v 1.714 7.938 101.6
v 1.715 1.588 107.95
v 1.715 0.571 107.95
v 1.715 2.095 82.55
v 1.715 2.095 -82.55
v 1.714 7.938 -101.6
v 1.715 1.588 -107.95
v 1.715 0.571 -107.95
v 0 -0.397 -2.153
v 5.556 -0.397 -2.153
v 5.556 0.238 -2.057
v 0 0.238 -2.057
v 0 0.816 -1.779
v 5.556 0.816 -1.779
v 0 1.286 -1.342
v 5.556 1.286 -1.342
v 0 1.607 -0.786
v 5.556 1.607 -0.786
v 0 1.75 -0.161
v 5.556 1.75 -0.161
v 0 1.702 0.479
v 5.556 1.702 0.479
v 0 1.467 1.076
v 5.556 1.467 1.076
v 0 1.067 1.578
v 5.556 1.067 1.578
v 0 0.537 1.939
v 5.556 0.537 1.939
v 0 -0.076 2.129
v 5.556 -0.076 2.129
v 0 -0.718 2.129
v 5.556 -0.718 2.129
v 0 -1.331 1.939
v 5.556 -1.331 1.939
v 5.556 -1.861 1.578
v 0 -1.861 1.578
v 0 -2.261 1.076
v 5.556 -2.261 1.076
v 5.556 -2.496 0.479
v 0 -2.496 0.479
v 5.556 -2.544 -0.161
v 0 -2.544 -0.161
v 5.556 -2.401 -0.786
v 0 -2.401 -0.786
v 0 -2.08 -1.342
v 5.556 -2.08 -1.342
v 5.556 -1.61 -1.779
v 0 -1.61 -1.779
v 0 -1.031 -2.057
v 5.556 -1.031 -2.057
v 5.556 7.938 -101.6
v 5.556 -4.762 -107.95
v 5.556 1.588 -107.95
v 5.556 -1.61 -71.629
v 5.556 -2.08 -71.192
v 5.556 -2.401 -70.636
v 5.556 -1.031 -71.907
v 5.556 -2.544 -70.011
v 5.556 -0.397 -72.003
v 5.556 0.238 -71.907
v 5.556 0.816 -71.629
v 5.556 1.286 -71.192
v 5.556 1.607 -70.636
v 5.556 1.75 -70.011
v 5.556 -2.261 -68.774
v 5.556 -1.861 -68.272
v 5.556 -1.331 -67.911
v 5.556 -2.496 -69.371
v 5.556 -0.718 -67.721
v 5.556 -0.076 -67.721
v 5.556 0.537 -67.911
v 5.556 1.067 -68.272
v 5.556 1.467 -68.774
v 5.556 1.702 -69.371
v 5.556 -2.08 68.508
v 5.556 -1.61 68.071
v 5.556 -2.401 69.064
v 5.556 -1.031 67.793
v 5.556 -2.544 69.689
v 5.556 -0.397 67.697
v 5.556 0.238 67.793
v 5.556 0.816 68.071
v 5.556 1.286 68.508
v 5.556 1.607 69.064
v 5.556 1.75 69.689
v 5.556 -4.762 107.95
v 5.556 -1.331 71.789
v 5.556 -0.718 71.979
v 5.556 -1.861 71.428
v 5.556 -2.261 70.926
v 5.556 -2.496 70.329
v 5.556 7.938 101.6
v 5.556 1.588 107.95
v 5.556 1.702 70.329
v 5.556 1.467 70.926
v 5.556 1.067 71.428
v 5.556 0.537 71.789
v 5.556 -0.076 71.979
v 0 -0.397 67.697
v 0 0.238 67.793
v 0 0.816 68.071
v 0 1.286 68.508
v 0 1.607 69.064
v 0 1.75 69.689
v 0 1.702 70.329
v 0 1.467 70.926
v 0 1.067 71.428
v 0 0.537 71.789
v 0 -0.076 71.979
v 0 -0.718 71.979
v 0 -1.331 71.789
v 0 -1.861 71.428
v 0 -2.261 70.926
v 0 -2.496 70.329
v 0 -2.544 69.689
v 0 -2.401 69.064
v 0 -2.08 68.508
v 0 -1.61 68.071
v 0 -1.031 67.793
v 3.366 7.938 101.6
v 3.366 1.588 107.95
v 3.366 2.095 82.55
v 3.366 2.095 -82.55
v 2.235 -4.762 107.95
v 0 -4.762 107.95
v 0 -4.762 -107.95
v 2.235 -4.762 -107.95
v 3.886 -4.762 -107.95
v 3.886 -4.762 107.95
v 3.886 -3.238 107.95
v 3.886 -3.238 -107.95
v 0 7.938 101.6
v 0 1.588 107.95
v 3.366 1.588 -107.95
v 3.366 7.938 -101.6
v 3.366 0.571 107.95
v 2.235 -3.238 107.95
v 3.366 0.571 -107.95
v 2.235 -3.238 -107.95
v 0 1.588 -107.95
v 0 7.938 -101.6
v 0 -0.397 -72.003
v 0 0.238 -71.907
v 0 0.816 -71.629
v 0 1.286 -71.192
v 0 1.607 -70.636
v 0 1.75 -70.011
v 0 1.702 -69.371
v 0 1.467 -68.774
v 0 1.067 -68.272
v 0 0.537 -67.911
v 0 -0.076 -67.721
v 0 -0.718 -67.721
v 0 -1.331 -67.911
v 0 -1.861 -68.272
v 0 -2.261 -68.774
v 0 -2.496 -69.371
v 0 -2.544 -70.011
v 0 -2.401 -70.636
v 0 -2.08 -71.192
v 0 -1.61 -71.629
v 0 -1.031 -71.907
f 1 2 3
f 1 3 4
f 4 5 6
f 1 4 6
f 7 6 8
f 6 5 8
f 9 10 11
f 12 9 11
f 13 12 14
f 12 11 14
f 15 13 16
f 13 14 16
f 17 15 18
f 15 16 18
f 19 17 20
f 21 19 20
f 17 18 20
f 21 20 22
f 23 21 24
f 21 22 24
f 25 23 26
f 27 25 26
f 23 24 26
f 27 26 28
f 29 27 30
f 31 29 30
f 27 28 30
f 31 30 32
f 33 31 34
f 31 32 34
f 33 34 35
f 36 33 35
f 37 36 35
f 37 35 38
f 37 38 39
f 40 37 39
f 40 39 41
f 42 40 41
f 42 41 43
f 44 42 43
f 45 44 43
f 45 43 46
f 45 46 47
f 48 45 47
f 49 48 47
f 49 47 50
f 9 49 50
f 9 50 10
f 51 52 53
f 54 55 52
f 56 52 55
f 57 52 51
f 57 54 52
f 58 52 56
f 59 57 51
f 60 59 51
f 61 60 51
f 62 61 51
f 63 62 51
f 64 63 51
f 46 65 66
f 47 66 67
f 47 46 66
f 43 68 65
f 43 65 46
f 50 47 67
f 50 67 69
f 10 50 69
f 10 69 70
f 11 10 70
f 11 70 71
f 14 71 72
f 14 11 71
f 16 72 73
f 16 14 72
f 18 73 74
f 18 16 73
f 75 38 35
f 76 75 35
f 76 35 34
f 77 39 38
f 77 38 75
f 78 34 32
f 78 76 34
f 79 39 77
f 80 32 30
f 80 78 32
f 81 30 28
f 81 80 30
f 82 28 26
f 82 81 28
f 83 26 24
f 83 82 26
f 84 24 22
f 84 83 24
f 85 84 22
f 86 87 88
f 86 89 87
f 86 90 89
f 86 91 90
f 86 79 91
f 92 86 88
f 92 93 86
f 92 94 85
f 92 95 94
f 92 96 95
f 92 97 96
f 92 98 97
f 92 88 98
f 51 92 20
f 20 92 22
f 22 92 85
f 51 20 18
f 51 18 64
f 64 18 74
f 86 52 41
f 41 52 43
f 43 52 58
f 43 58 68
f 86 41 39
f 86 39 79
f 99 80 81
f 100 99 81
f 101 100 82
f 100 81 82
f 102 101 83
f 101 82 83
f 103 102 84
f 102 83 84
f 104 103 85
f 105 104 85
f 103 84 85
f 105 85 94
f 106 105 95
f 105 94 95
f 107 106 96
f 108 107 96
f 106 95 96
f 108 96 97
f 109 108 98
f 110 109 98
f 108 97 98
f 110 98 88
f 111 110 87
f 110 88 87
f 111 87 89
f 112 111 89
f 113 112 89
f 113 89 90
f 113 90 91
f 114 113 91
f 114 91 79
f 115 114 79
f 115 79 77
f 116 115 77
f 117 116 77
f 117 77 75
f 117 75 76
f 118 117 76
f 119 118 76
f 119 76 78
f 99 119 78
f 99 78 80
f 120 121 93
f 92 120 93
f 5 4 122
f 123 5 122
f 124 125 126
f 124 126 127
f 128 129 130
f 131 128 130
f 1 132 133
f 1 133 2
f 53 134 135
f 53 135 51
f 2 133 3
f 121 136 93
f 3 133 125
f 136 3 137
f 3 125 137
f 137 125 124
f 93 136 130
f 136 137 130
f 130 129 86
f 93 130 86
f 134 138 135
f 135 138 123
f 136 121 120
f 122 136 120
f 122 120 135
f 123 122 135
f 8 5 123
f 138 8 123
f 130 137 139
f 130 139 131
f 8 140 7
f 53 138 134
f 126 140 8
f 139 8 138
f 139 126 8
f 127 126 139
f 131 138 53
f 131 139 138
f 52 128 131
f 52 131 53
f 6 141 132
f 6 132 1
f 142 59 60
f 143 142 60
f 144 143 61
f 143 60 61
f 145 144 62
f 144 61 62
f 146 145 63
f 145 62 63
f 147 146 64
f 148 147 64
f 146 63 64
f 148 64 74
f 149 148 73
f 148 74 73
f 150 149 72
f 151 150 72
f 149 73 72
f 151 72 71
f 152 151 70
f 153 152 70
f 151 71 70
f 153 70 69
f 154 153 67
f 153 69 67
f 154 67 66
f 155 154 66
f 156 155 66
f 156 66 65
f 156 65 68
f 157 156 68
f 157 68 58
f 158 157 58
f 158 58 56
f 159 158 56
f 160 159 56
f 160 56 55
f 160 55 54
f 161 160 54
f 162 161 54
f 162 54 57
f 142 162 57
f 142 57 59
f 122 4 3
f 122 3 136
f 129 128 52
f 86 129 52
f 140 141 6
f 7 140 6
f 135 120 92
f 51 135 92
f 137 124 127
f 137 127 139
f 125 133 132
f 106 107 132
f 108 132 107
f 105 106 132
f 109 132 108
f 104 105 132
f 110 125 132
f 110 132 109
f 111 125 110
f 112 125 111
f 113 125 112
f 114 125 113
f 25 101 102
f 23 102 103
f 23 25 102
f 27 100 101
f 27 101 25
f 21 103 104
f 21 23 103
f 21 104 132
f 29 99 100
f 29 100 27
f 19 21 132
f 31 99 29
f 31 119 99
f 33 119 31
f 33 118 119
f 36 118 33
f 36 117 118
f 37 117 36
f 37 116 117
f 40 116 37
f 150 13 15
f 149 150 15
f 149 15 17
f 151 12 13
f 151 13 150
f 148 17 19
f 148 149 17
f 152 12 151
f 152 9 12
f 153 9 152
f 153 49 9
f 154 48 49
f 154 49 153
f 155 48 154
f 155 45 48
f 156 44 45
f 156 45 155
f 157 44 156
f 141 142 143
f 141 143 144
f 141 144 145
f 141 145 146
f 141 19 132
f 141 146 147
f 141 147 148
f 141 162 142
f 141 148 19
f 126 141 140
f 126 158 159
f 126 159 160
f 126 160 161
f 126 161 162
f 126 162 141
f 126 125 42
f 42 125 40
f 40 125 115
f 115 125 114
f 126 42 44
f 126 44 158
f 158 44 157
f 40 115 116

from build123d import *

# Parameters (mm, degrees)
SKETCH1_W                    = 5.55625
SKETCH1_H                    = 9.525
BOSS_EXTRUDE1_DEPTH          = 107.95
SKETCH17_W                   = 1.651
SKETCH17_H                   = 2.667
CUT_EXTRUDE8_DEPTH           = 216.9
SKETCH18_W                   = 1.651
SKETCH18_H                   = 1.524
CUT_EXTRUDE9_DEPTH           = 216.9
F_18_0_1695_DIAMETER_HOLE1_D = 4.3053
CHAMFER1_SIZE                = 1.524
CHAMFER1_SIZE2               = 25.4
CHAMFER2_SIZE                = 25.4
CHAMFER2_SIZE2               = 1.524
SKETCH25_W                   = 1.7145
SKETCH25_H                   = 215.9
SKETCH25_W_2                 = 2.19075
BOSS_EXTRUDE2_DEPTH          = 3.175
CHAMFER3_SIZE                = 6.35


with BuildPart() as part:
    # Sketch1 → Boss-Extrude1 (new body, symmetric)
    with BuildSketch(Plane.XY):
        with Locations((2.778125, 0)):
            Rectangle(SKETCH1_W, SKETCH1_H)
    extrude(amount=BOSS_EXTRUDE1_DEPTH, both=True)

    # Sketch17 → Cut-Extrude8 (cut, through all)
    with BuildSketch(Plane.XY.offset(107.95)):
        with Locations((2.54, 3.429)):
            Rectangle(SKETCH17_W, SKETCH17_H)
    extrude(amount=-CUT_EXTRUDE8_DEPTH, mode=Mode.SUBTRACT)

    # Sketch18 → Cut-Extrude9 (cut, through all)
    with BuildSketch(Plane.XY.offset(107.95)):
        with Locations((3.0607, -4.0005)):
            Rectangle(SKETCH18_W, SKETCH18_H)
    extrude(amount=-CUT_EXTRUDE9_DEPTH, mode=Mode.SUBTRACT)

    # #18 (0.1695) Diameter Hole1 (through all)
    with Locations(Plane.ZY):
        with Locations((69.85, -0.396875), (-69.85, -0.396875), (0, -0.396875)):
            Hole(F_18_0_1695_DIAMETER_HOLE1_D / 2)

    # Chamfer1
    chamfer1_edges = [part.edges().sort_by_distance(p)[0] for p in [
        (2.54, 2.0955, 107.95),
    ]]
    chamfer1_side = [part.faces().sort_by_distance(p)[0] for p in [
        (2.785461813, -0.109400999, 107.95),
    ]]
    chamfer(chamfer1_edges, length=CHAMFER1_SIZE, length2=CHAMFER1_SIZE2, reference=chamfer1_side[0])

    # Chamfer2
    chamfer2_edges = [part.edges().sort_by_distance(p)[0] for p in [
        (2.54, 2.0955, -107.95),
    ]]
    chamfer2_side = [part.faces().sort_by_distance(p)[0] for p in [
        (2.54, 2.0955, -12.7),
    ]]
    chamfer(chamfer2_edges, length=CHAMFER2_SIZE, length2=CHAMFER2_SIZE2, reference=chamfer2_side[0])

    # Sketch25 → Boss-Extrude2 (add)
    with BuildSketch(Plane(origin=(0, 4.7625, 0), x_dir=(1, 0, 0), z_dir=(0, 1, 0))):
        with Locations((0.85725, 0)):
            Rectangle(SKETCH25_W, SKETCH25_H)
        with Locations((4.460875, 0)):
            Rectangle(SKETCH25_W_2, SKETCH25_H)
    extrude(amount=BOSS_EXTRUDE2_DEPTH)

    # Chamfer3
    chamfer3_edges = [part.edges().sort_by_distance(p)[0] for p in [
        (4.460875, 7.9375, -107.95),
        (4.460875, 7.9375, 107.95),
        (0.85725, 7.9375, 107.95),
        (0.85725, 7.9375, -107.95),
    ]]
    chamfer(chamfer3_edges, length=CHAMFER3_SIZE)


solid = part.part
